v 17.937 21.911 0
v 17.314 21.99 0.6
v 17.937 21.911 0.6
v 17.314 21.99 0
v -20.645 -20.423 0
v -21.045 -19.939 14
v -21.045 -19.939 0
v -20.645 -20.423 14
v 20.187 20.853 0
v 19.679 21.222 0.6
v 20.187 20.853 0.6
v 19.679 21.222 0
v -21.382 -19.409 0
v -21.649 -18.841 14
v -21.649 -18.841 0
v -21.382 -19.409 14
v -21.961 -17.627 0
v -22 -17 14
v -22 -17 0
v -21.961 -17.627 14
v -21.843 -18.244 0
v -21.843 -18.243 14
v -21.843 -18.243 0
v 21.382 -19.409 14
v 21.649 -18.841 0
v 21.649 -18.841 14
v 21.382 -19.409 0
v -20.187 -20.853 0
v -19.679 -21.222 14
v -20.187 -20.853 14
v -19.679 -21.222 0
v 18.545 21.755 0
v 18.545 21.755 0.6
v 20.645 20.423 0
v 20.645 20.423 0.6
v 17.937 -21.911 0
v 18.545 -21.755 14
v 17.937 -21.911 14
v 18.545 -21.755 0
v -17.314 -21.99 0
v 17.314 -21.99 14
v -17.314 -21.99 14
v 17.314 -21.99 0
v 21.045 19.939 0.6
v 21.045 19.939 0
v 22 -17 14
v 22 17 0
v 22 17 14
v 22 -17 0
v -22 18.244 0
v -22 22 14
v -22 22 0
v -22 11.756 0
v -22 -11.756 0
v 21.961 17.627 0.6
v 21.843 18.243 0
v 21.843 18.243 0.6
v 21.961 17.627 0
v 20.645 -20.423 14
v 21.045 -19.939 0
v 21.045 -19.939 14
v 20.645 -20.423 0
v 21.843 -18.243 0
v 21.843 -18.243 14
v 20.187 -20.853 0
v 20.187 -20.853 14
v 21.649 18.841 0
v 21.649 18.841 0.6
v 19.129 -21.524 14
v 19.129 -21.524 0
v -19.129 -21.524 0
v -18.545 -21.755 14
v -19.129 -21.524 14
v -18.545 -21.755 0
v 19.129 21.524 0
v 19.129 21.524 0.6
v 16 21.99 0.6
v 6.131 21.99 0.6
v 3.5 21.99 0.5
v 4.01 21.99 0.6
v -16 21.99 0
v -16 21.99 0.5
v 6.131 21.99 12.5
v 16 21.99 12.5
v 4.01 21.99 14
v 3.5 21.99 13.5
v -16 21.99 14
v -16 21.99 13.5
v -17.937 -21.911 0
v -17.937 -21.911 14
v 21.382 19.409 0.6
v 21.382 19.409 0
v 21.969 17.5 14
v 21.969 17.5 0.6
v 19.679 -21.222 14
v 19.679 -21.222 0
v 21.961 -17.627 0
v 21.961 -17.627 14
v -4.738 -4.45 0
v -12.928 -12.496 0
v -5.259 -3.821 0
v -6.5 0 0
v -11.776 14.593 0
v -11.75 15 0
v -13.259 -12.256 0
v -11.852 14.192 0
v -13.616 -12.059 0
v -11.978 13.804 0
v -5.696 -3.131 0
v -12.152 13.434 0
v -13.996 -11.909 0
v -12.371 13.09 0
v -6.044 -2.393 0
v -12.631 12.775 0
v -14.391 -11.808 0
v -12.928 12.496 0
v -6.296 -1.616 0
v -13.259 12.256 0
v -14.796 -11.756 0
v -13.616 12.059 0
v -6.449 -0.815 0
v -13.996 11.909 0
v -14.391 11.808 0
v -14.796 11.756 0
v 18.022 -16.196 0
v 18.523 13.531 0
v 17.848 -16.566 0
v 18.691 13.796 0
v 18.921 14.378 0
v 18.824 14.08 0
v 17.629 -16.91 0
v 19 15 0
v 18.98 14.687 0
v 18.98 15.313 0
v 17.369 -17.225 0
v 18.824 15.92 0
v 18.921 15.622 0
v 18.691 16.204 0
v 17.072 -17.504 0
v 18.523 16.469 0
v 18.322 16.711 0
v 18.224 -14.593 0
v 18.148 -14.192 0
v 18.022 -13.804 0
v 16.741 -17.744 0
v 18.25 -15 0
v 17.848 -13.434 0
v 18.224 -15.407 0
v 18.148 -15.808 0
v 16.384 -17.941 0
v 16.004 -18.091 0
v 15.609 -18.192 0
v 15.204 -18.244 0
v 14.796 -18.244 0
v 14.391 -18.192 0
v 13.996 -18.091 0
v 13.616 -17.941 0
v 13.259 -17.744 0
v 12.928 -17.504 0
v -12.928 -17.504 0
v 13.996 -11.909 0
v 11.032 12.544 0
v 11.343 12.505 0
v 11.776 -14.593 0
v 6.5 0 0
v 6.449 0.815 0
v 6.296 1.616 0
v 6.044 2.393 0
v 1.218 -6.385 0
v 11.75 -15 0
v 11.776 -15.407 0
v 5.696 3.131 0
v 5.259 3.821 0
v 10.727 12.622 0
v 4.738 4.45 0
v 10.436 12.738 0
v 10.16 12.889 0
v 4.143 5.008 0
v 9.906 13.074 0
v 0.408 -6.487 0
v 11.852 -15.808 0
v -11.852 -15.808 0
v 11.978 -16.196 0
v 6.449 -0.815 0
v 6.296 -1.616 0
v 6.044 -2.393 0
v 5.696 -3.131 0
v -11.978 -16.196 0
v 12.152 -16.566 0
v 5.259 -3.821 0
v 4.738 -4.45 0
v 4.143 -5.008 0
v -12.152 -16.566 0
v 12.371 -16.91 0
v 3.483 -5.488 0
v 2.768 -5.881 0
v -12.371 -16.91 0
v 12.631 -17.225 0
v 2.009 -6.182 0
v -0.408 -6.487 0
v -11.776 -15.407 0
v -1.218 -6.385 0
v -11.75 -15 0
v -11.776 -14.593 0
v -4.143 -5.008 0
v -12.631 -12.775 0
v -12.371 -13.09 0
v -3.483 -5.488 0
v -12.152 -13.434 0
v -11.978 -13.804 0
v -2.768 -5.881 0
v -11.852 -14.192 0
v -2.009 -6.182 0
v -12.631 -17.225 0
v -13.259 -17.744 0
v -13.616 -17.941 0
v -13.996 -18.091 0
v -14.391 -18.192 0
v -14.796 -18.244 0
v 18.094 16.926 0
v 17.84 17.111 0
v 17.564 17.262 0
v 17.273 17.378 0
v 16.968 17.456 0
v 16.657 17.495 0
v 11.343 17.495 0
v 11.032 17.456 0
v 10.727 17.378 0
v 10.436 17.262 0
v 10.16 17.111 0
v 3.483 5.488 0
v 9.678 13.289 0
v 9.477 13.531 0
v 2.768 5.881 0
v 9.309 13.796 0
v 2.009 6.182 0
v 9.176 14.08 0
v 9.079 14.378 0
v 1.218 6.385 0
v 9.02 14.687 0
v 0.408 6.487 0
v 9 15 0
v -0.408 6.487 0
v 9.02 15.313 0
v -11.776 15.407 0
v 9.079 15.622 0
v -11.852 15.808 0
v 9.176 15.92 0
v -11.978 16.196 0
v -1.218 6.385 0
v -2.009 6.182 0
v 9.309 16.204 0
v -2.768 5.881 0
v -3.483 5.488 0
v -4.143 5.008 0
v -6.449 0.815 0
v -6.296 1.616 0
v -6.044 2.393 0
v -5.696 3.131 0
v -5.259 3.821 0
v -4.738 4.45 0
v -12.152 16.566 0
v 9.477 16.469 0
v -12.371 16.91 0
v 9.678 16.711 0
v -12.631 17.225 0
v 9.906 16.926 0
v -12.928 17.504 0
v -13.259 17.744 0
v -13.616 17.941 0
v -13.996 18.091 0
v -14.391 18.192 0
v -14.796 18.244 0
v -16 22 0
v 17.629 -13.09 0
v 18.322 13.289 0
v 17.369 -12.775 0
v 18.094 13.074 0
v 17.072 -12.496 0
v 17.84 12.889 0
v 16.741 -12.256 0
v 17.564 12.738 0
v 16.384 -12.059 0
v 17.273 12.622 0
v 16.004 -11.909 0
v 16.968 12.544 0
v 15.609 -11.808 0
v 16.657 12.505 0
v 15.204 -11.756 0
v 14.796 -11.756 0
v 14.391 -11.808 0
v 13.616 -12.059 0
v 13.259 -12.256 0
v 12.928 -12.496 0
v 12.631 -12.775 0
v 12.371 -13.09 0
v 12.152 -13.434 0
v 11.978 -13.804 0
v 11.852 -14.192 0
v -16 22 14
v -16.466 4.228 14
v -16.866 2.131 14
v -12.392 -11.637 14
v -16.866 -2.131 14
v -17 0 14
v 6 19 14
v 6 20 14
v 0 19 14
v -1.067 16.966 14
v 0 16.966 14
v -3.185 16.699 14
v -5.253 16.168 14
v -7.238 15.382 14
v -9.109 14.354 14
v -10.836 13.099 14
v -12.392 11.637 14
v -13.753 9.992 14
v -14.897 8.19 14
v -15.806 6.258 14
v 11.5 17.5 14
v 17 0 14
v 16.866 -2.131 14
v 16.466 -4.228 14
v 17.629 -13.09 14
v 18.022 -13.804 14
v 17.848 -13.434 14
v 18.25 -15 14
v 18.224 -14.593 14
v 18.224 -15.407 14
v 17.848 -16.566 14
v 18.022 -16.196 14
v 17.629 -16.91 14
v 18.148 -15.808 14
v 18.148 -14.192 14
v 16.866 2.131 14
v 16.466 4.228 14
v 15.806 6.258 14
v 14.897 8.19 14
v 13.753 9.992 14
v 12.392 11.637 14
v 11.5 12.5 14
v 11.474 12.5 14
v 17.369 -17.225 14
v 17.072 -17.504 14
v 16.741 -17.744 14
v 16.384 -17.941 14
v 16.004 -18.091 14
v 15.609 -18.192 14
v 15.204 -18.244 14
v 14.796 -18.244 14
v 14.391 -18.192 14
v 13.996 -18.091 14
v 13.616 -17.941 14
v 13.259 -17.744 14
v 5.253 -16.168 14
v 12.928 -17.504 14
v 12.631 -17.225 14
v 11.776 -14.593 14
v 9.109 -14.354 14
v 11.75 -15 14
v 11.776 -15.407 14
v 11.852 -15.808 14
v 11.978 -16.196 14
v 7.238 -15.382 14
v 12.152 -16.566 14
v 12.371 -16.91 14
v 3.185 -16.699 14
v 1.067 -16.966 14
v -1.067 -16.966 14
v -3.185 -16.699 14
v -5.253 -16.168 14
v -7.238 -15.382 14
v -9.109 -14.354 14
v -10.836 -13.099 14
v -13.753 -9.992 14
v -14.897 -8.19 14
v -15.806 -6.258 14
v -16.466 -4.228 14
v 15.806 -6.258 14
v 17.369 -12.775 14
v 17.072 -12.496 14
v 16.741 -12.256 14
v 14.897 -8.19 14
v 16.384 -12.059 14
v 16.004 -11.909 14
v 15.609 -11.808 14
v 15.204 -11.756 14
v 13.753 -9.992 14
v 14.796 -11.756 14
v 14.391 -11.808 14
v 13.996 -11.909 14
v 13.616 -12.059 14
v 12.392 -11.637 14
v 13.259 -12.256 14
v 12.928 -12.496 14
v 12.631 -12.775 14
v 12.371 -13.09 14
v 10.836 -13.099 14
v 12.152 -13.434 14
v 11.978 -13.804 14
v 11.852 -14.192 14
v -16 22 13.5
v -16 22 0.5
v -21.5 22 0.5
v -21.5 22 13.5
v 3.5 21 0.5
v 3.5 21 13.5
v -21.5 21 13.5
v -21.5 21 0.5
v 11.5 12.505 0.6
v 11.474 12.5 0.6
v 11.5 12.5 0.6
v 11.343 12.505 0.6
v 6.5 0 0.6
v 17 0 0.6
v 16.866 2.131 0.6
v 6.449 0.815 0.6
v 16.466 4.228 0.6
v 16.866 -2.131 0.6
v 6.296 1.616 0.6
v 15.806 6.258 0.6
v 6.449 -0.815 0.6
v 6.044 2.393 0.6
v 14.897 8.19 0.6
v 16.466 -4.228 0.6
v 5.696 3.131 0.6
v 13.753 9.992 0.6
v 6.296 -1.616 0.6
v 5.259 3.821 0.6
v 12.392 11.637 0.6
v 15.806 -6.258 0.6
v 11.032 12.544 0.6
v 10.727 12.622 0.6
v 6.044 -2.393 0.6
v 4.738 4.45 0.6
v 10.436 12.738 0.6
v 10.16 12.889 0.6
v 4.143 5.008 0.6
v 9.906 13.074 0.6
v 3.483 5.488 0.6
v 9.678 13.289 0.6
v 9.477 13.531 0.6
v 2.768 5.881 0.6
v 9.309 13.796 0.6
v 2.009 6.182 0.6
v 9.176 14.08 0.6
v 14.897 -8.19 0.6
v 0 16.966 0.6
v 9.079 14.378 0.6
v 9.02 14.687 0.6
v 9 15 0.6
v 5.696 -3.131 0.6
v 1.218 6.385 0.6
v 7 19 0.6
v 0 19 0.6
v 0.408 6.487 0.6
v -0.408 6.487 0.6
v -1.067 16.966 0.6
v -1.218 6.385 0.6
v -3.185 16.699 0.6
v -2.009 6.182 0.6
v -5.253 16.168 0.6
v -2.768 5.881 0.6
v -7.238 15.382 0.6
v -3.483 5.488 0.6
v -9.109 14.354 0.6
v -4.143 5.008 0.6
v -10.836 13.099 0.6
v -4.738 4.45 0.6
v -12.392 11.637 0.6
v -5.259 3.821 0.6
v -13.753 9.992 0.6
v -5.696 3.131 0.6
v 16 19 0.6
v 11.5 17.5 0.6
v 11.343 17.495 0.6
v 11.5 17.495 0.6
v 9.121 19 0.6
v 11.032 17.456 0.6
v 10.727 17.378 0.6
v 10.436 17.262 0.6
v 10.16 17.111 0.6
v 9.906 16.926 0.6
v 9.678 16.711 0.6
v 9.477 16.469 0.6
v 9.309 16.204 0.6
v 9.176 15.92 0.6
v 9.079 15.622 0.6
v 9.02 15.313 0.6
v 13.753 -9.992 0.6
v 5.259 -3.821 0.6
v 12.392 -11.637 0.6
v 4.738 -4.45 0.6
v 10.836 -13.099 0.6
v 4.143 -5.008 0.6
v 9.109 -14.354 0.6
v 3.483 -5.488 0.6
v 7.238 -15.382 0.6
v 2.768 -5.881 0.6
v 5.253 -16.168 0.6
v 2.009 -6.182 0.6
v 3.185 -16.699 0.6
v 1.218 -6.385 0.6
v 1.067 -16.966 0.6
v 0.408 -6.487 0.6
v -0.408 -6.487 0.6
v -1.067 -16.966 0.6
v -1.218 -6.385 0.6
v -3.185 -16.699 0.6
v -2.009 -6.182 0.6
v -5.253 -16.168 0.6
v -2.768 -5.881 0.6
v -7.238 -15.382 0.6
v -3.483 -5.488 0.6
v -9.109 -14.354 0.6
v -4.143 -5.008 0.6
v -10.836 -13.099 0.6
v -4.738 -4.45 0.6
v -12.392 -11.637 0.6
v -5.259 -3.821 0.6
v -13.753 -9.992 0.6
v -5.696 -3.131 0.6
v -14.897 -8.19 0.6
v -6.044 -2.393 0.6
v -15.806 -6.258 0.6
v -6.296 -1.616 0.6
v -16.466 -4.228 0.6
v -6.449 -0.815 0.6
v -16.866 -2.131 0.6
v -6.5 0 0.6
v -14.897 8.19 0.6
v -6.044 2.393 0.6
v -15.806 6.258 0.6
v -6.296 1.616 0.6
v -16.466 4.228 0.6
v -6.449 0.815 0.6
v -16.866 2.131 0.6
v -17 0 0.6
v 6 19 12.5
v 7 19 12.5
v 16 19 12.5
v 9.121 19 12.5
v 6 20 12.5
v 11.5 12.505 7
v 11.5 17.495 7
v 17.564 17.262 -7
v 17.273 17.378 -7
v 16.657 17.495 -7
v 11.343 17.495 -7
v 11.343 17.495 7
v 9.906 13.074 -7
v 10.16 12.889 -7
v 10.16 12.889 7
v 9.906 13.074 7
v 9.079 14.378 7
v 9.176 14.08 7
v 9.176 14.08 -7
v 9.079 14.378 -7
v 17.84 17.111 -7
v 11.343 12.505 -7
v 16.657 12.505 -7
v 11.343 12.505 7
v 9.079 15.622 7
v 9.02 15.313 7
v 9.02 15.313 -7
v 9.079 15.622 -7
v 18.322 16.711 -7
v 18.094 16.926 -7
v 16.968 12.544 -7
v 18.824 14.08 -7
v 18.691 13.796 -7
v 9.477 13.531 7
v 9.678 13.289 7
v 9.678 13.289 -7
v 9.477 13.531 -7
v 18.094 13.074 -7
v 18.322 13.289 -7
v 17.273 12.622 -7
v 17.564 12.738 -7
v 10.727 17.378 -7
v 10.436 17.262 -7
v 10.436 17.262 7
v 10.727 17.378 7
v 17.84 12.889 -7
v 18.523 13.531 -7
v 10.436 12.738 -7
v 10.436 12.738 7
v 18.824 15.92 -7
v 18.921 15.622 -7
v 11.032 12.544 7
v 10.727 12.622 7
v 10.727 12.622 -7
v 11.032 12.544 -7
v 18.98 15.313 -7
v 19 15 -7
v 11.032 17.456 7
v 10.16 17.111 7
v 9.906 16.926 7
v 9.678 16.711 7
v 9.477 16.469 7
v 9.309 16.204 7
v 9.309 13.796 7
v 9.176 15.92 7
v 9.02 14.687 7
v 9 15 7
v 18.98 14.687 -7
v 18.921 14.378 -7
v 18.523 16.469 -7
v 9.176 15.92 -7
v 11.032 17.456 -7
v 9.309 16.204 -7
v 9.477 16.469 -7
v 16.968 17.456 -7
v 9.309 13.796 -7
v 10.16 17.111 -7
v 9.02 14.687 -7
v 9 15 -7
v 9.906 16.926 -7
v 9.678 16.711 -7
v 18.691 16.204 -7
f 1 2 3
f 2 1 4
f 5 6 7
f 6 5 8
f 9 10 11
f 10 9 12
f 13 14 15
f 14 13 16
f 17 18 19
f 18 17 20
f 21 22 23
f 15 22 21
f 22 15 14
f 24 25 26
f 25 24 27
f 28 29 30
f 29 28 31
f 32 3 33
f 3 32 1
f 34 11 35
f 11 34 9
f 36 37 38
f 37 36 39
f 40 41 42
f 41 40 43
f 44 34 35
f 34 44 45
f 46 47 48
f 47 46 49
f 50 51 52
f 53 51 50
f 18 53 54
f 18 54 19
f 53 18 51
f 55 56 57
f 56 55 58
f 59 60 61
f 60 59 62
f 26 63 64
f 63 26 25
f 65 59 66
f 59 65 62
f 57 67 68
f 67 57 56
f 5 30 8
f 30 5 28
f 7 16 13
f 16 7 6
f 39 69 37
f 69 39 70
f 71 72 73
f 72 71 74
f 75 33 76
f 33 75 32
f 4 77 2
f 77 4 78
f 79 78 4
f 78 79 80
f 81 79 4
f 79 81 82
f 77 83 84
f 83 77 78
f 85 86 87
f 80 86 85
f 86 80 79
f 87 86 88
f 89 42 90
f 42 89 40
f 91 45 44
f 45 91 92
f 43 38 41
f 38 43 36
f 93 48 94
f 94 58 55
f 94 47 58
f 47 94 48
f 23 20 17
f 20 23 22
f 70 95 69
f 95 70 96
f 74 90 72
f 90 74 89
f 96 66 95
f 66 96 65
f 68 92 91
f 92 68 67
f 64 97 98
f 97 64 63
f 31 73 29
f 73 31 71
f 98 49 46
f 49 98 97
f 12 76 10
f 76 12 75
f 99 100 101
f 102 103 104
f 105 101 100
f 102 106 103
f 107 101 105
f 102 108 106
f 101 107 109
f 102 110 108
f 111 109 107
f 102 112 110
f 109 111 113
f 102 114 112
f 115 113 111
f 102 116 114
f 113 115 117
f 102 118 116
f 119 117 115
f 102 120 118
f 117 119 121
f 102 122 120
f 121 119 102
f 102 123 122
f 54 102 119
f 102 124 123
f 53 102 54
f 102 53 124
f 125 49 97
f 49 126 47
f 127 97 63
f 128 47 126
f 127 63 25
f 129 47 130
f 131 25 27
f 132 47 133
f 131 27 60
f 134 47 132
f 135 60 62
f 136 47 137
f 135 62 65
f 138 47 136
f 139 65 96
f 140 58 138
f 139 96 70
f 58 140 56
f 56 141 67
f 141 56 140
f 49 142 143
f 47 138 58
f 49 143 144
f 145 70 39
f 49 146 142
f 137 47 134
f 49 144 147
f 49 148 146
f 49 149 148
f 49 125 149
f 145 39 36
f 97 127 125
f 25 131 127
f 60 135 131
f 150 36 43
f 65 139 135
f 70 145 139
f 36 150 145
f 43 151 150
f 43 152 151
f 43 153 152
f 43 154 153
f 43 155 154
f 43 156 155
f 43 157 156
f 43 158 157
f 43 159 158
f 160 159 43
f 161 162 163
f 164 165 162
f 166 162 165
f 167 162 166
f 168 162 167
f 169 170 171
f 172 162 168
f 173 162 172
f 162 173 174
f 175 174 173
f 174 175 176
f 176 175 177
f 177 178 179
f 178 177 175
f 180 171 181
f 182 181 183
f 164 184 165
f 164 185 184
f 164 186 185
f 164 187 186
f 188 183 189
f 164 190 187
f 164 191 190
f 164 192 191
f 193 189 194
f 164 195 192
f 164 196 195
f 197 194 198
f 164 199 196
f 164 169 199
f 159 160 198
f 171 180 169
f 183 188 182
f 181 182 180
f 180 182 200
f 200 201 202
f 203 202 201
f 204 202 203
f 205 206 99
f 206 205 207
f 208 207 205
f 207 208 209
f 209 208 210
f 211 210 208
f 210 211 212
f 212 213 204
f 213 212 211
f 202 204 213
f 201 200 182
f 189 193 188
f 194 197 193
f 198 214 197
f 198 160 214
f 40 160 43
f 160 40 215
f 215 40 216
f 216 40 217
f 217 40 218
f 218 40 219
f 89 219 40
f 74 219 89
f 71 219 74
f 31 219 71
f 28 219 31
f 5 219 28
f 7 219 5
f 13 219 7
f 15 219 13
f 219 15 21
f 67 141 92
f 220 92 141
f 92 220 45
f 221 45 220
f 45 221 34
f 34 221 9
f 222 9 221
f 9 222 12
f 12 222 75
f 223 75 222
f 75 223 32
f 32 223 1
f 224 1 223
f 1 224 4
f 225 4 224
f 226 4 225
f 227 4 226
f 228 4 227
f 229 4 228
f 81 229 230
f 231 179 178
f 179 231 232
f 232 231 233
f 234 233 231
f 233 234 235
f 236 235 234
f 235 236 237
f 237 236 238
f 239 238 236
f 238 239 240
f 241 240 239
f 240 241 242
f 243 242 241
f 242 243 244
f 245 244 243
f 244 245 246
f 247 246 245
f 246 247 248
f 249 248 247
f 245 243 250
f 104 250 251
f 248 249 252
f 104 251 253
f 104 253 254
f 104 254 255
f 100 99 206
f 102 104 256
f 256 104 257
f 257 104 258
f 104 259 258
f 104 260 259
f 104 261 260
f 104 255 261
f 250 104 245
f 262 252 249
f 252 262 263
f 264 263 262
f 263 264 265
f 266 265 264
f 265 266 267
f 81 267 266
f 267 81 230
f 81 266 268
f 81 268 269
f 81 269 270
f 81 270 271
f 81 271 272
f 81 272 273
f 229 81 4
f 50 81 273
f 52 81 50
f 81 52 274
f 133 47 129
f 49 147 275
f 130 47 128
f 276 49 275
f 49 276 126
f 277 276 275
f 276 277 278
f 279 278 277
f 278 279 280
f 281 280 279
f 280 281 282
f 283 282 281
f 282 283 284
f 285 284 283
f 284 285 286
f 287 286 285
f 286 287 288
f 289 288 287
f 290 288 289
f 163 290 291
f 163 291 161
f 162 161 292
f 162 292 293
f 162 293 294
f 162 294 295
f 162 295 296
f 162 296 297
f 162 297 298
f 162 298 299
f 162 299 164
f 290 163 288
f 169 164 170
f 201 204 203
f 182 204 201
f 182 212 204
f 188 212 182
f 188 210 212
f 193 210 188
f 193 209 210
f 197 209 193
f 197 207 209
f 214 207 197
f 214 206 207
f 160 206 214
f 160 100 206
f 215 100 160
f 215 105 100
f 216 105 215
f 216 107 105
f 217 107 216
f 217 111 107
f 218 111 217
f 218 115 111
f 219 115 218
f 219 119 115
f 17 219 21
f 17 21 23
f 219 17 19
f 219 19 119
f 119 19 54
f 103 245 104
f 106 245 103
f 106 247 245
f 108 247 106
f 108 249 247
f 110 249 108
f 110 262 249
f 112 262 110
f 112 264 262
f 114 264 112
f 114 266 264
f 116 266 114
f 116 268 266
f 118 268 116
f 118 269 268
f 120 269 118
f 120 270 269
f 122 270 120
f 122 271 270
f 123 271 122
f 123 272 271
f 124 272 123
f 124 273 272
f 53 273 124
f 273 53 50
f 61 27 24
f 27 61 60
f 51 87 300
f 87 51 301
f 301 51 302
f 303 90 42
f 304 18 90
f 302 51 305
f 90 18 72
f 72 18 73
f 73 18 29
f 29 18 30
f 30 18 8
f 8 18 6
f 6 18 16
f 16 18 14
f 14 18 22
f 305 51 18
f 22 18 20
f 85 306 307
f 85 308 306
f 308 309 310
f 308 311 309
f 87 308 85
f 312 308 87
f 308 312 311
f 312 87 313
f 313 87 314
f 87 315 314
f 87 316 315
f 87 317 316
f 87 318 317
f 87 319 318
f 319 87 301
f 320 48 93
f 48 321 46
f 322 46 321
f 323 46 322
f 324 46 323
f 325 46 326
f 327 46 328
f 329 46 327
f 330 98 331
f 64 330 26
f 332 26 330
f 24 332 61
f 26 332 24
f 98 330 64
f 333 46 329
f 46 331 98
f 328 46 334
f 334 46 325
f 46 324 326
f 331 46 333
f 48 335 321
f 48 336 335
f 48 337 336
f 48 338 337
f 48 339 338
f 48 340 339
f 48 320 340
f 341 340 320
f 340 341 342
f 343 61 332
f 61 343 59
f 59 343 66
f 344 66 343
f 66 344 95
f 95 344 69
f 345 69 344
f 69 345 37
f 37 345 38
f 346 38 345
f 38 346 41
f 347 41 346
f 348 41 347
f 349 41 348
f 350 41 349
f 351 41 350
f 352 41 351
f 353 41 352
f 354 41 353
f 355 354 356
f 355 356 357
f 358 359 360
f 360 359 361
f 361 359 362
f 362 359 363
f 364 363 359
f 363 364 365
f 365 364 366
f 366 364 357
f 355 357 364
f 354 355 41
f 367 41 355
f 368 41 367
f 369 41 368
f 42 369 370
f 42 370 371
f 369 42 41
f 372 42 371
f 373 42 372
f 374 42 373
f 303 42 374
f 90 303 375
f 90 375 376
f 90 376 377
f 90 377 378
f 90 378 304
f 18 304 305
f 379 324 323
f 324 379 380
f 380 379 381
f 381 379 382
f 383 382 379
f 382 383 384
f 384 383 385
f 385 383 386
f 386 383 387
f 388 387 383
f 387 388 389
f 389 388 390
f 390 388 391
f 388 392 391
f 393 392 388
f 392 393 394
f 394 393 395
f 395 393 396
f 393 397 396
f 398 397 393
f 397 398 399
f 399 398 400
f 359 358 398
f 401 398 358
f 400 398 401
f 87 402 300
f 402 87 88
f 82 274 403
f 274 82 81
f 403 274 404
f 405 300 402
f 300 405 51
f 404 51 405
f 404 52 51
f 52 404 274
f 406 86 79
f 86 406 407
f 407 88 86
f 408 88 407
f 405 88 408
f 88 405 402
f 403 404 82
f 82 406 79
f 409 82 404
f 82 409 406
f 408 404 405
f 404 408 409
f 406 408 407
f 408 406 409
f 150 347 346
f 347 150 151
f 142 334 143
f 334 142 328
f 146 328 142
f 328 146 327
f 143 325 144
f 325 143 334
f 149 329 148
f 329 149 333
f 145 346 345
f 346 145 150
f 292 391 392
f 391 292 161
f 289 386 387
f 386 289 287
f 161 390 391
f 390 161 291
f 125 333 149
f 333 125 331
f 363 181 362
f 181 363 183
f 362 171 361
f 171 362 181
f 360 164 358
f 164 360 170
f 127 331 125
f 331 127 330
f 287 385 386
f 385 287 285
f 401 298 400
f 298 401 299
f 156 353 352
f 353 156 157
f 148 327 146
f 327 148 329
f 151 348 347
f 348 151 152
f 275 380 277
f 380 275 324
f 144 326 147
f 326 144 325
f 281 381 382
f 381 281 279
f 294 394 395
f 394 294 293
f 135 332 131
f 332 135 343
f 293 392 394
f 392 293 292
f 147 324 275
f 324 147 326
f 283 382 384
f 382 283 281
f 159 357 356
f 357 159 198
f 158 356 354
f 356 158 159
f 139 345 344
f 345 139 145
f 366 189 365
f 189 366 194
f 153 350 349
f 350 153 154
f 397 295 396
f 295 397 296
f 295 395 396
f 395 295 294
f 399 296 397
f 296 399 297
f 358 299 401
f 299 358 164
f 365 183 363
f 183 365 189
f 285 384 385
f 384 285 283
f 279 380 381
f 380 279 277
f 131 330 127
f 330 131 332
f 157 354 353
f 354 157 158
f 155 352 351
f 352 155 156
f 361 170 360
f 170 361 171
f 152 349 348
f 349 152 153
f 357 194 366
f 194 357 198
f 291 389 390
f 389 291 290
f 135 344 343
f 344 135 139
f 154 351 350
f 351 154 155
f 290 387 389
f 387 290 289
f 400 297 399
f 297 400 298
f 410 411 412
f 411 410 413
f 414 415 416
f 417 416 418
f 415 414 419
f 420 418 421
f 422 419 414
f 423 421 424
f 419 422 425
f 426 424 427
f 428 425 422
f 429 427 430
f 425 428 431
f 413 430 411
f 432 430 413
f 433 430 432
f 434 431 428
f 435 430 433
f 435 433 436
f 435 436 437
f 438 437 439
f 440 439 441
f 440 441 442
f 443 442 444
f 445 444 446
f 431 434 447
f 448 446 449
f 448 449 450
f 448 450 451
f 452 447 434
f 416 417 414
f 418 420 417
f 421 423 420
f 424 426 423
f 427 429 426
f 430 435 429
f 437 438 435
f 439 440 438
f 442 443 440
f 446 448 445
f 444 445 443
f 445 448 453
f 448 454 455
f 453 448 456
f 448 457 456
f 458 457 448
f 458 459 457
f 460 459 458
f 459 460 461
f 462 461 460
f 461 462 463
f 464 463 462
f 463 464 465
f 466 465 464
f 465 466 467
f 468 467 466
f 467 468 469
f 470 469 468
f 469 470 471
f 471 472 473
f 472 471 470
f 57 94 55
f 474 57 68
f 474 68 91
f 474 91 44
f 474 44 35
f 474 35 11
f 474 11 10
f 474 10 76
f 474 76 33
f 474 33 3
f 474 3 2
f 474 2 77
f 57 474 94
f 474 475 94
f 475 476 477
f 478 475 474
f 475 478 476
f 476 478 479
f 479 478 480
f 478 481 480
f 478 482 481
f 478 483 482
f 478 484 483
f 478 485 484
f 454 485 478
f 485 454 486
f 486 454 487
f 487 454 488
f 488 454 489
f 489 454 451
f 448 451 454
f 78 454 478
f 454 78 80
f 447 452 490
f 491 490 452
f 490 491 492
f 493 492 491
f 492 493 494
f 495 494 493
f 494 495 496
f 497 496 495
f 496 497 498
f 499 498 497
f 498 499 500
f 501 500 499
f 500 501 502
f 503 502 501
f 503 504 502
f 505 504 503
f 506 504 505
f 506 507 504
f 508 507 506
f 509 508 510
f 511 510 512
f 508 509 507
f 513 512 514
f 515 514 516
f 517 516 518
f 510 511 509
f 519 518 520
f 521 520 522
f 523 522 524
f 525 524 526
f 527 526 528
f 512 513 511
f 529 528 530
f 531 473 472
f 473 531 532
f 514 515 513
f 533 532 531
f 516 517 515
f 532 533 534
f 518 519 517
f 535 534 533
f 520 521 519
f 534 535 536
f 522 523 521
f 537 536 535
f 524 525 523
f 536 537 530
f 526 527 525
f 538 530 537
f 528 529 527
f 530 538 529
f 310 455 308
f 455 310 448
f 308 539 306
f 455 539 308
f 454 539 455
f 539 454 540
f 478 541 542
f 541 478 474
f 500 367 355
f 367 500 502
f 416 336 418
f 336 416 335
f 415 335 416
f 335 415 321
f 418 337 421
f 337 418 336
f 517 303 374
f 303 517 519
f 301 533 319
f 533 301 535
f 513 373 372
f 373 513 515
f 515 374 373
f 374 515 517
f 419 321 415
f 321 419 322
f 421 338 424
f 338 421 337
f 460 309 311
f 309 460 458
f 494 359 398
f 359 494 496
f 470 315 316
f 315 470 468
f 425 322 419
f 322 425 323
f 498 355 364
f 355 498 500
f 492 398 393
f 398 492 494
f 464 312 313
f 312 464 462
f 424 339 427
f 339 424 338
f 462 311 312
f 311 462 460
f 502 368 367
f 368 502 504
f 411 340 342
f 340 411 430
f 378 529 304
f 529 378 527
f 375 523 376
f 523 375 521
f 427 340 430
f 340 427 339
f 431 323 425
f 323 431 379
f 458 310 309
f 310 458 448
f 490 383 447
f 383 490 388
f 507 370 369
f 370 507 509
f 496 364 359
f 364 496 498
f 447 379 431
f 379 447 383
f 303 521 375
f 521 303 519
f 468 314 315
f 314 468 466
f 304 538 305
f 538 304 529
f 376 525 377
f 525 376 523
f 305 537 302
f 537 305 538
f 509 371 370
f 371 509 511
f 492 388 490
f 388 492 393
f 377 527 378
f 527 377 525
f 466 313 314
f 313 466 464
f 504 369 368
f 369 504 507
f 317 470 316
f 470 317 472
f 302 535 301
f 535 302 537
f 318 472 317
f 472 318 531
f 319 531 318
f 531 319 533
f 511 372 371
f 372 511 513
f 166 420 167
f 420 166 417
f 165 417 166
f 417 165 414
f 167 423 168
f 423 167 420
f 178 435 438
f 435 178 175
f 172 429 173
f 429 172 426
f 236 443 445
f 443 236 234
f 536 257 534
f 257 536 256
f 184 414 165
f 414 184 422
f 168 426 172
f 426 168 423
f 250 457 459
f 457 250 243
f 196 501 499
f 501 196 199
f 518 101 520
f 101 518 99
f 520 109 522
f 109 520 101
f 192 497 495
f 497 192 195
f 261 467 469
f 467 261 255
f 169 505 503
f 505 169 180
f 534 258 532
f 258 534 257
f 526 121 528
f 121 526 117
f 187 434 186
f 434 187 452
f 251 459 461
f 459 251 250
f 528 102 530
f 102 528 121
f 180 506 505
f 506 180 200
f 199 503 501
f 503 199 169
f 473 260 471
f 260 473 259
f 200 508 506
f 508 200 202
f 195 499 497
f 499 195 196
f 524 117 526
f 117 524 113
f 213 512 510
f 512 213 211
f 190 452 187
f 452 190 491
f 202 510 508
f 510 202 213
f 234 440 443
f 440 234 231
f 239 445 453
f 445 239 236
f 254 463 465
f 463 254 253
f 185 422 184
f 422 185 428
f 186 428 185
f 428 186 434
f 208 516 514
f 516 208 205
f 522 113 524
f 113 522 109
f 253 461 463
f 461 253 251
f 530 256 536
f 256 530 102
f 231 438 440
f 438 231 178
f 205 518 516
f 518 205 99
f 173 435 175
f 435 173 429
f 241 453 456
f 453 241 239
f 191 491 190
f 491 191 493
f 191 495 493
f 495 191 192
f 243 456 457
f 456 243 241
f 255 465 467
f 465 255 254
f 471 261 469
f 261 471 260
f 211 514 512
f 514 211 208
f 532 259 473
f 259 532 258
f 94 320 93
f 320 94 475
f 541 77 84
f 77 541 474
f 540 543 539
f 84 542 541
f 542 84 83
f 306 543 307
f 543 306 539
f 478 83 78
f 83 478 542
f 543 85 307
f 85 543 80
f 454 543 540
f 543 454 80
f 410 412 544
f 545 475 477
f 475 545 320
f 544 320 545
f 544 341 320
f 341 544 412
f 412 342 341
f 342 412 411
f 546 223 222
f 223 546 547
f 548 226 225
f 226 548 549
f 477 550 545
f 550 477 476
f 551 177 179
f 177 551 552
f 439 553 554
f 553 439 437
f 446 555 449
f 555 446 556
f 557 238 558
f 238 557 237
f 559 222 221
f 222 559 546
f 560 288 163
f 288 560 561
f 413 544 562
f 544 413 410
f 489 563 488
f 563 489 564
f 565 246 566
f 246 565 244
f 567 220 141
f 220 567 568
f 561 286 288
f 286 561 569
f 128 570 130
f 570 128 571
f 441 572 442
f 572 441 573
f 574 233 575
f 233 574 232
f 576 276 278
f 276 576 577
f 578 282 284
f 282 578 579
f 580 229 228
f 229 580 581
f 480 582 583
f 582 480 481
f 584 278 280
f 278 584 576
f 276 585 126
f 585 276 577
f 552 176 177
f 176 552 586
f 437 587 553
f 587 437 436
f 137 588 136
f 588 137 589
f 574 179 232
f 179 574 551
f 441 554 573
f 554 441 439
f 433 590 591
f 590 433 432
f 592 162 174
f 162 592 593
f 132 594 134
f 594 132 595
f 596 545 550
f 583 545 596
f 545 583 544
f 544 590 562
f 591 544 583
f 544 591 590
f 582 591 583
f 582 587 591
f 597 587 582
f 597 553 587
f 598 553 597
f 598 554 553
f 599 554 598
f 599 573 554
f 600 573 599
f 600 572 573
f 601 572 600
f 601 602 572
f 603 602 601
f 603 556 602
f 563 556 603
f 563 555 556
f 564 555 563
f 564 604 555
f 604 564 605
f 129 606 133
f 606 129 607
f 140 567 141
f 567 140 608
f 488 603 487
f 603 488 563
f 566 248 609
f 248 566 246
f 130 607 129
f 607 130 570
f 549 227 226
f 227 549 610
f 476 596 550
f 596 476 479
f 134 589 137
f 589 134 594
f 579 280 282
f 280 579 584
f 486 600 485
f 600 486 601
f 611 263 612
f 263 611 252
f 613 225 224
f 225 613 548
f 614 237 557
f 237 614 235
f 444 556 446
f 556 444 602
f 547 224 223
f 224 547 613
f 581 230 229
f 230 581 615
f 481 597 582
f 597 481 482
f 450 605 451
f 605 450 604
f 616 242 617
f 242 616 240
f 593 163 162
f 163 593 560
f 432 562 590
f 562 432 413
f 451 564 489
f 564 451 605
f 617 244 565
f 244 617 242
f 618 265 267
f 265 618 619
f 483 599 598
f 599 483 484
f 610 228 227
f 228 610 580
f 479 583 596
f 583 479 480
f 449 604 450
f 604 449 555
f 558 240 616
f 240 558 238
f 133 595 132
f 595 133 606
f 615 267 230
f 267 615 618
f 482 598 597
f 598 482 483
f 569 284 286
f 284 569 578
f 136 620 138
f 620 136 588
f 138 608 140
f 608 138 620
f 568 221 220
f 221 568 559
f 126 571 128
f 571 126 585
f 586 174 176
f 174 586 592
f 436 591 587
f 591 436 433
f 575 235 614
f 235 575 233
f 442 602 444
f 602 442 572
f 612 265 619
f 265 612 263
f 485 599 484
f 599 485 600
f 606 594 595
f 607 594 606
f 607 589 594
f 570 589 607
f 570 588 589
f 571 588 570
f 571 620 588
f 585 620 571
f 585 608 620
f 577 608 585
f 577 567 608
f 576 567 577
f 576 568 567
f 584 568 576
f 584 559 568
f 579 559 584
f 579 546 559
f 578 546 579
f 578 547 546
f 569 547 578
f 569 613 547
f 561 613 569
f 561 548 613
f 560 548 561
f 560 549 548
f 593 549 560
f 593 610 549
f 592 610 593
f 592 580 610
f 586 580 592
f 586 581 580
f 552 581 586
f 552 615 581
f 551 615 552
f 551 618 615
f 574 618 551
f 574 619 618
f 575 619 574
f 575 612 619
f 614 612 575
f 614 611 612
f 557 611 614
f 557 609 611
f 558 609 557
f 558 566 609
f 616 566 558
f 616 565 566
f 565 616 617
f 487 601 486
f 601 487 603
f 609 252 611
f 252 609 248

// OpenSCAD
$fn = 50;


union() {
	difference() {
		union() {
			hull() {
				translate(v = [-17.0000000000, 17.0000000000, 0]) {
					cylinder(h = 14, r = 5);
				}
				translate(v = [17.0000000000, 17.0000000000, 0]) {
					cylinder(h = 14, r = 5);
				}
				translate(v = [-17.0000000000, -17.0000000000, 0]) {
					cylinder(h = 14, r = 5);
				}
				translate(v = [17.0000000000, -17.0000000000, 0]) {
					cylinder(h = 14, r = 5);
				}
			}
			translate(v = [-22.0000000000, 16.0000000000, 0]) {
				cube(size = [6, 6, 14]);
			}
		}
		union() {
			translate(v = [-22.5000000000, -15.0000000000, -250.0000000000]) {
				rotate(a = [0, 0, 0]) {
					difference() {
						union() {
							hull() {
								translate(v = [7.5000000000, 0, 0]) {
									cylinder(h = 250, r = 3.2500000000, r1 = 3.2500000000, r2 = 3.2500000000);
								}
								translate(v = [-7.5000000000, 0, 0]) {
									cylinder(h = 250, r = 3.2500000000, r1 = 3.2500000000, r2 = 3.2500000000);
								}
							}
						}
						union();
					}
				}
			}
			translate(v = [-22.5000000000, 15.0000000000, -250.0000000000]) {
				rotate(a = [0, 0, 0]) {
					difference() {
						union() {
							hull() {
								translate(v = [7.5000000000, 0, 0]) {
									cylinder(h = 250, r = 3.2500000000, r1 = 3.2500000000, r2 = 3.2500000000);
								}
								translate(v = [-7.5000000000, 0, 0]) {
									cylinder(h = 250, r = 3.2500000000, r1 = 3.2500000000, r2 = 3.2500000000);
								}
							}
						}
						union();
					}
				}
			}
			translate(v = [-21.5000000000, 21.0000000000, 0.5000000000]) {
				cube(size = [25, 1, 13.0000000000]);
			}
			translate(v = [15.0000000000, -15.0000000000, 0]) {
				cylinder(h = 100, r = 3.2500000000);
			}
			translate(v = [0.0000000000, 11.0000000000, 0.6000000000]) {
				cube(size = [11, 8, 16.4000000000]);
			}
			translate(v = [0, 0, 0.6000000000]) {
				cylinder(h = 16.4000000000, r = 17.0000000000);
			}
			translate(v = [0, 0, -7.0000000000]) {
				cylinder(h = 14, r = 6.5000000000);
			}
			translate(v = [0.0000000000, 17.5000000000, 0.6000000000]) {
				cube(size = [22.0000000000, 1.5000000000, 16.4000000000]);
			}
			translate(v = [16.0000000000, 17.5000000000, 0.6000000000]) {
				cube(size = [6, 4.5000000000, 16.4000000000]);
			}
			translate(v = [6.0000000000, 17.5000000000, 12.5000000000]) {
				cube(size = [16, 4.5000000000, 1.5000000000]);
			}
			translate(v = [3.2500000000, 22.7500000000, 0.6000000000]) {
				rotate(a = [0, 0, -45]) {
					cube(size = [7.5000000000, 1.5000000000, 16.4000000000]);
				}
			}
			translate(v = [2.5000000000, 12.5000000000, 0.6000000000]) {
				cube(size = [9.0000000000, 5, 13.4000000000]);
			}
		}
	}
	union() {
		translate(v = [14, 15.0000000000, -7.0000000000]) {
			rotate(a = [0, 0, 0]) {
				difference() {
					union() {
						#hull() {
							#translate(v = [2.5000000000, 0, 0]) {
								cylinder(h = 14, r = 2.5000000000, r1 = 2.5000000000, r2 = 2.5000000000);
							}
							#translate(v = [-2.5000000000, 0, 0]) {
								cylinder(h = 14, r = 2.5000000000, r1 = 2.5000000000, r2 = 2.5000000000);
							}
						}
					}
					union();
				}
			}
		}
	}
}
